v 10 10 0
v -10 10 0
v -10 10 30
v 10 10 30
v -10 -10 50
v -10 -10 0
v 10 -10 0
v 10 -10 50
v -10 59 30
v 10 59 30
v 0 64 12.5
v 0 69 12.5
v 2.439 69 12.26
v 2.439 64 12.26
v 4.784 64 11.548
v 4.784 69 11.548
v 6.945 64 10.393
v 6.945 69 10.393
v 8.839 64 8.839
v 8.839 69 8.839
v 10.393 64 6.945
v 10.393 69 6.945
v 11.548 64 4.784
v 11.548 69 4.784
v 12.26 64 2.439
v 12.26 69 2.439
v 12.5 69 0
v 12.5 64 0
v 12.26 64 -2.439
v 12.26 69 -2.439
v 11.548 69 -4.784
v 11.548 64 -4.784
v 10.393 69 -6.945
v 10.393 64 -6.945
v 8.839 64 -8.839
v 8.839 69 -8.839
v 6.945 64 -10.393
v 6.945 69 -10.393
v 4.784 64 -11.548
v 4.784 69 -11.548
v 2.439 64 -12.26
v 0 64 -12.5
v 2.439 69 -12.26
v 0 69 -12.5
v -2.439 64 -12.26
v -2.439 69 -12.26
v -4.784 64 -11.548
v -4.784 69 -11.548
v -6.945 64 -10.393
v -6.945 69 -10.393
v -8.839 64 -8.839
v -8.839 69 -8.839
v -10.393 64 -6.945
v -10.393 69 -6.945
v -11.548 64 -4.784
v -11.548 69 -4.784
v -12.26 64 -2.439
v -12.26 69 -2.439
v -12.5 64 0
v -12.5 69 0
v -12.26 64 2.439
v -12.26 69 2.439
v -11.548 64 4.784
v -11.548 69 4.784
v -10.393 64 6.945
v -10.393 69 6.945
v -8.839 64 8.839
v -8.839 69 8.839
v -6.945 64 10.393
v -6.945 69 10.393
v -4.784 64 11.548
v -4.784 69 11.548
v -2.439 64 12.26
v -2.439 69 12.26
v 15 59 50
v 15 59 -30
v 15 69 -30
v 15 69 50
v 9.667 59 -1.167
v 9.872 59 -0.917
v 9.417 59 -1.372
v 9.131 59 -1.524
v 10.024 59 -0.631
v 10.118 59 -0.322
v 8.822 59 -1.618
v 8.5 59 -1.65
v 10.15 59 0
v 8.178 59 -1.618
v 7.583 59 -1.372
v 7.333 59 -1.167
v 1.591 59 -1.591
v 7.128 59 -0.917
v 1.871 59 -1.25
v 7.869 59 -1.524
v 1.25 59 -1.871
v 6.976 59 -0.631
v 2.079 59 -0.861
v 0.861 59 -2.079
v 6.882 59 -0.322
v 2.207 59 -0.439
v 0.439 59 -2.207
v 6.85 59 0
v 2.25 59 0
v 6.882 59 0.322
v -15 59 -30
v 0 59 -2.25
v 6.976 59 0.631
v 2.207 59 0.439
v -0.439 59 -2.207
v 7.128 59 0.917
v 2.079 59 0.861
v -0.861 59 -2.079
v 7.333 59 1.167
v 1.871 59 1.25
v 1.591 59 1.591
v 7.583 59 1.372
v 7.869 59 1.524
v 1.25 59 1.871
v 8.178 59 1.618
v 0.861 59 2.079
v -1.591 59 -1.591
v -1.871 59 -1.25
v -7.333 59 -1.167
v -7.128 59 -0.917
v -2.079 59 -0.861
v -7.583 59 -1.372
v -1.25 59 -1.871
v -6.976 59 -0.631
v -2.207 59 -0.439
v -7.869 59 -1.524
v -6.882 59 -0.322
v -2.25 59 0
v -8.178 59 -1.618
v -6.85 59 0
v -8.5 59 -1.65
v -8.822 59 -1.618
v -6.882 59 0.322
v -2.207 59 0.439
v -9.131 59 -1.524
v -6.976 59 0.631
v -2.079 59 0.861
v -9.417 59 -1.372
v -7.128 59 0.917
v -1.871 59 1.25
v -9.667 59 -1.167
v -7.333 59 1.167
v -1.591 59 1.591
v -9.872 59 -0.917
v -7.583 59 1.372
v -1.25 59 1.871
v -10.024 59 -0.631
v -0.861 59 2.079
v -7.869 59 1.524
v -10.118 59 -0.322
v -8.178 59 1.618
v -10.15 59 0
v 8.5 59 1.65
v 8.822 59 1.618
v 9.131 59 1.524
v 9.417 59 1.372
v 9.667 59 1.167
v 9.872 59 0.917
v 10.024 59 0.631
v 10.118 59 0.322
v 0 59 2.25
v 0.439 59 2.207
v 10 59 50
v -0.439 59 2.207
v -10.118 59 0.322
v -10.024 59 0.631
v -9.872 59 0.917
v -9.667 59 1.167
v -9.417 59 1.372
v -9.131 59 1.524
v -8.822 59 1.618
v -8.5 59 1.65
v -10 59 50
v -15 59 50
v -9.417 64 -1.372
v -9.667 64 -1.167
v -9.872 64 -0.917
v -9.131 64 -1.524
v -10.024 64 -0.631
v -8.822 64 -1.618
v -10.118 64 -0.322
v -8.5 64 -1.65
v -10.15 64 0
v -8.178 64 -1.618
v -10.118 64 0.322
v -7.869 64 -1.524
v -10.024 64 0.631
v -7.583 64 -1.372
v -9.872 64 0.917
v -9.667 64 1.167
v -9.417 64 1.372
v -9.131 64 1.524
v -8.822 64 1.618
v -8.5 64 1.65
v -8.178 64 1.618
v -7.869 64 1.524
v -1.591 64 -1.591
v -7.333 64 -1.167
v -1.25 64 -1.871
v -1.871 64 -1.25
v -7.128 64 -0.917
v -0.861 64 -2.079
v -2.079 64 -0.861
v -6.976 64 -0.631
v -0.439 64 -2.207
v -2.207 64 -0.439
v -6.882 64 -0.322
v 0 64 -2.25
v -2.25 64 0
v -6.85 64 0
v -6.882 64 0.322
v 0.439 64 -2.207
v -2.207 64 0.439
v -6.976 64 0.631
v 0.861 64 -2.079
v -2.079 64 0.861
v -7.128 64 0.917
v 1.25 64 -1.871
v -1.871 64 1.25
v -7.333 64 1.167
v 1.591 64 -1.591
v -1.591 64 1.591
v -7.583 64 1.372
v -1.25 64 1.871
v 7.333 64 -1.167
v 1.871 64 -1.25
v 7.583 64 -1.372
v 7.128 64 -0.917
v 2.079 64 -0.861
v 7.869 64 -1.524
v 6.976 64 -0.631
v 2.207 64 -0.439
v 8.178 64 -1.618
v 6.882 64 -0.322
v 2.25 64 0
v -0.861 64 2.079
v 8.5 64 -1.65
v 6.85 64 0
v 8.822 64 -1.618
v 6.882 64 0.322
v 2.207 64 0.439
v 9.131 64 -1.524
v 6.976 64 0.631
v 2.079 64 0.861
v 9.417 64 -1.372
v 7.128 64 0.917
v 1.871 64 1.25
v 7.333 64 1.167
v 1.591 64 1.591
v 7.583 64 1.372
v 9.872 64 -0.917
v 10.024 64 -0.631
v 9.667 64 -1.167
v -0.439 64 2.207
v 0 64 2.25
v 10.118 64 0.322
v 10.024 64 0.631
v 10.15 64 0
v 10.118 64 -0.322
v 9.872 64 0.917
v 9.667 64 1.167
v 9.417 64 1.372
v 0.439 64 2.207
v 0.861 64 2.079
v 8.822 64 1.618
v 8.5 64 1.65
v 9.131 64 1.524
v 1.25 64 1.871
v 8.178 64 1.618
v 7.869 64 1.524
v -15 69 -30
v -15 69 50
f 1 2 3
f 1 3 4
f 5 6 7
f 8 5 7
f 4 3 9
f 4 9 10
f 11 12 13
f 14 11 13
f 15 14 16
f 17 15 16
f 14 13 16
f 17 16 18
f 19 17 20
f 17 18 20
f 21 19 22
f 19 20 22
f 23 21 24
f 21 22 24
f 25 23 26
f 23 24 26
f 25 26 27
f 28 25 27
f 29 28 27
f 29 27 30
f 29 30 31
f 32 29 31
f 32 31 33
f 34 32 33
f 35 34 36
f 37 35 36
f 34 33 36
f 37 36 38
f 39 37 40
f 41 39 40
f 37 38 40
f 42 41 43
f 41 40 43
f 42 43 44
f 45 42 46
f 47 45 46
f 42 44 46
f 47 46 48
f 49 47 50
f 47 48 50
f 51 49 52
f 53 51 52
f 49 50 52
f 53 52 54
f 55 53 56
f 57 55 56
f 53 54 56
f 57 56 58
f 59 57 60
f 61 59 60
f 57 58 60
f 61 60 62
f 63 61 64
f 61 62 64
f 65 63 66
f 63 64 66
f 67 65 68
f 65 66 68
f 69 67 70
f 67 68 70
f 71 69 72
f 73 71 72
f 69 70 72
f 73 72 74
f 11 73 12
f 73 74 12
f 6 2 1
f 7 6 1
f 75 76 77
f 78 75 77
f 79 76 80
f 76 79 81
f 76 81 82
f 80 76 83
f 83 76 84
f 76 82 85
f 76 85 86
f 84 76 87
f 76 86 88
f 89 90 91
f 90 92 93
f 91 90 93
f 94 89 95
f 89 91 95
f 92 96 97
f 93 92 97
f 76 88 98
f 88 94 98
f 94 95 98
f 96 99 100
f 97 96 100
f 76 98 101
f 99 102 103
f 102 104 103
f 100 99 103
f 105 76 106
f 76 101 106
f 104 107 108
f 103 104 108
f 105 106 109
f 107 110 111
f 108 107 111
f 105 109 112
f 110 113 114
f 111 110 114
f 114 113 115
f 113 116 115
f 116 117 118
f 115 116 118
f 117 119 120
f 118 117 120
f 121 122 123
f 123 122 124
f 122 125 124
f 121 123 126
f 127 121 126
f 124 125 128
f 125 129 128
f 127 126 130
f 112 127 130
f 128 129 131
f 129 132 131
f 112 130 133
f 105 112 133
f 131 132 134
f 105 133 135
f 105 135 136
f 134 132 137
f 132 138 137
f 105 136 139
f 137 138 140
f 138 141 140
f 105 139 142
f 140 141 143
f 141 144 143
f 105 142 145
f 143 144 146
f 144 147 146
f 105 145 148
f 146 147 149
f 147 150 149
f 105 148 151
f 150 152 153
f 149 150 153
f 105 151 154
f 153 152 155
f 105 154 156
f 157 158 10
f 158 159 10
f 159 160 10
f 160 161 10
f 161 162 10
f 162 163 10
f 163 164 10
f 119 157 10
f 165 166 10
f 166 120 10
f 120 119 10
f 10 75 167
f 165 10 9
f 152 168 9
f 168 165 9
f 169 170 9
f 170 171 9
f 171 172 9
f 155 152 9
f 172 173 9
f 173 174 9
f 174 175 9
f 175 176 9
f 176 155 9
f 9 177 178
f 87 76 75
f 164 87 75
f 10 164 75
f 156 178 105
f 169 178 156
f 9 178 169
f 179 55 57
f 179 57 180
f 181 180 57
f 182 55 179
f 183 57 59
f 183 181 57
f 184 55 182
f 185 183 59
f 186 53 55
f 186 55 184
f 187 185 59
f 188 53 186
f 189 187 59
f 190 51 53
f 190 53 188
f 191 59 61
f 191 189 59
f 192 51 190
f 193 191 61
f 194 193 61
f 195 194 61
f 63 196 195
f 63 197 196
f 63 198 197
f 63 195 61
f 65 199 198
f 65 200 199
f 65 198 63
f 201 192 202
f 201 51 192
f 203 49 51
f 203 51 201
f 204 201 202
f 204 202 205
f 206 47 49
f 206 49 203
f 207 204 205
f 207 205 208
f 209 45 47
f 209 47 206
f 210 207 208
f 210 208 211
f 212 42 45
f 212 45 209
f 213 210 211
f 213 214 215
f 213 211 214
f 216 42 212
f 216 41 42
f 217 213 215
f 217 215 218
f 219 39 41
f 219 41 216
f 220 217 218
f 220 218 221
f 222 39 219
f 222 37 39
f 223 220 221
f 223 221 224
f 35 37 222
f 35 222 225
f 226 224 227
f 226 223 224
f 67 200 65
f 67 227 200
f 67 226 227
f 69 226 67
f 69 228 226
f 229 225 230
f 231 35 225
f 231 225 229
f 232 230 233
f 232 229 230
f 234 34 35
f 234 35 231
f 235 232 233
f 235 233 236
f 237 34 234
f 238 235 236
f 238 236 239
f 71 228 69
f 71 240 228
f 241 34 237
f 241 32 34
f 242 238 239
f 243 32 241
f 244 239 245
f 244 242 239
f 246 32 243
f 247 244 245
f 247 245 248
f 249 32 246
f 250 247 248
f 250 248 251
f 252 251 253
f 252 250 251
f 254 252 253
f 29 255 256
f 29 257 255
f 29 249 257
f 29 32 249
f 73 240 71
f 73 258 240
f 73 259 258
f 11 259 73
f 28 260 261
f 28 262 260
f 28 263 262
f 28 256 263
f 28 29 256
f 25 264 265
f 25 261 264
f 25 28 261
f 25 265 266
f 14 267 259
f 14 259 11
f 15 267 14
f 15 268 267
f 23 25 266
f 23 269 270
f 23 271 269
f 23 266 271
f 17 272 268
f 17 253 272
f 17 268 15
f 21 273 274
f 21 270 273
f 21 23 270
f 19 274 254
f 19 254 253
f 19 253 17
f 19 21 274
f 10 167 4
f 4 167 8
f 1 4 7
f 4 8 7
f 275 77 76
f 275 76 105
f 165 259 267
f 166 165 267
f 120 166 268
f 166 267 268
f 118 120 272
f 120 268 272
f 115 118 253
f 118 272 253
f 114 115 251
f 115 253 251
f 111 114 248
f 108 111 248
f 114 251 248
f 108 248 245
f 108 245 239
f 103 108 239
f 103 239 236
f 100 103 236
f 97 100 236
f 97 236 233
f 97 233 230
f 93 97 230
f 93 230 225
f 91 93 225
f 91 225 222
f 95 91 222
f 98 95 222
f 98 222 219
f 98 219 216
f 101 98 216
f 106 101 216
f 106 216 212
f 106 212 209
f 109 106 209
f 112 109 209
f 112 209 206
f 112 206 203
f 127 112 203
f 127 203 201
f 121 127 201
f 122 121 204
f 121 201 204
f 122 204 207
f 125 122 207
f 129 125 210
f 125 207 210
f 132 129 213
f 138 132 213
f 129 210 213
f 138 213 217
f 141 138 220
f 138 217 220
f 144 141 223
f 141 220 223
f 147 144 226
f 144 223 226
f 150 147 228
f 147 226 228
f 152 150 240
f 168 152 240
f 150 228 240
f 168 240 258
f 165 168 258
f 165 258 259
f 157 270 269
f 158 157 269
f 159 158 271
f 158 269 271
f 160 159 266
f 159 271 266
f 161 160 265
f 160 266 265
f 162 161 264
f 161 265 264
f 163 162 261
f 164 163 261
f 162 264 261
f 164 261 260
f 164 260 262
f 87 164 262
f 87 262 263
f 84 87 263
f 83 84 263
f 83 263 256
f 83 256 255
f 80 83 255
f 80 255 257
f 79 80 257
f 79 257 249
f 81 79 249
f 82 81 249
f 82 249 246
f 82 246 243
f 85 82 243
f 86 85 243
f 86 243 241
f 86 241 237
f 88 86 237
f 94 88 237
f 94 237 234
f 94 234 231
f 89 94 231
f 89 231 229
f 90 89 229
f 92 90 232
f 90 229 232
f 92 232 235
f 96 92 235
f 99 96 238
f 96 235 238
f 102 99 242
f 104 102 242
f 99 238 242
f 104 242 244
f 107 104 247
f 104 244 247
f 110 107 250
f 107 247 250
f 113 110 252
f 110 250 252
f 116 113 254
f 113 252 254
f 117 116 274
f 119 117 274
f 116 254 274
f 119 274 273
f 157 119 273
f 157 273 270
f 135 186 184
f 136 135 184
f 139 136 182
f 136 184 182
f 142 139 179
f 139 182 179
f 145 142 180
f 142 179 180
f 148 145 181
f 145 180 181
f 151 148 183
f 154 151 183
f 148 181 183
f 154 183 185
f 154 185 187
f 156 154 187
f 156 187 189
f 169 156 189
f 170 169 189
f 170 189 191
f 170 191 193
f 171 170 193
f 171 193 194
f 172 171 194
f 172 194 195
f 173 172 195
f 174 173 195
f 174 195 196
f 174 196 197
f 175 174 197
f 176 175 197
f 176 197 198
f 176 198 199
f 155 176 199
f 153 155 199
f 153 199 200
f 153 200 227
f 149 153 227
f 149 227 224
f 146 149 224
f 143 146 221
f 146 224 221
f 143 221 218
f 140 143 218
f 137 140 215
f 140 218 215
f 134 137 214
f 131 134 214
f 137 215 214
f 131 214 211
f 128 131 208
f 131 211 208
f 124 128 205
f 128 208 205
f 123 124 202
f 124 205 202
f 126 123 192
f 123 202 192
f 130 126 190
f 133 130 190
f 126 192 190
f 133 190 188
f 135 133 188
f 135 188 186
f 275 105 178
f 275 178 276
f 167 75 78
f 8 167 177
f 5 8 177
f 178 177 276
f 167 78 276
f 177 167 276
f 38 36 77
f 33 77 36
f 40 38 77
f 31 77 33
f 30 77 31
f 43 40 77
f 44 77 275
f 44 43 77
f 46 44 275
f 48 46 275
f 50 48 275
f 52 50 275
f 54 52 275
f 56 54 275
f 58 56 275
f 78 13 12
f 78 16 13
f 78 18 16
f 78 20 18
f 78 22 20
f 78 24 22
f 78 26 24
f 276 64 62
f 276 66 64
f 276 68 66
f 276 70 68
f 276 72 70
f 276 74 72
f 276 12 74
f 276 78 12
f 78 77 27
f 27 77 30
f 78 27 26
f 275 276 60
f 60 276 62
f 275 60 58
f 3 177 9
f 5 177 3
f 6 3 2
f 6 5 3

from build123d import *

# Parameters (mm, degrees)
CROQUIS2_W                   = 20
CROQUIS2_H                   = 20
SALIENTE_EXTRUIR1_DEPTH      = 50
CROQUIS3_W                   = 20
CROQUIS3_H                   = 20
SALIENTE_EXTRUIR2_DEPTH      = 59
SALIENTE_EXTRUIR4_DEPTH      = 60
SALIENTE_EXTRUIR4_DEPTH_BACK = 20
CROQUIS7_W                   = 30
CROQUIS7_H                   = 10
CROQUIS14_R                  = 12.5
CORTAR_EXTRUIR4_DEPTH        = 5
CROQUIS16_R                  = 2.25
CORTAR_EXTRUIR5_DEPTH        = 10
CROQUIS19_R                  = 1.65
CORTAR_EXTRUIR6_DEPTH        = 10


with BuildPart() as part:
    # Croquis2 → Saliente-Extruir1 (new body)
    with BuildSketch(Plane.XY):
        Rectangle(CROQUIS2_W, CROQUIS2_H)
    extrude(amount=SALIENTE_EXTRUIR1_DEPTH)

    # Croquis3 → Saliente-Extruir2 (add)
    with BuildSketch(Plane(origin=(0, 10, 0), x_dir=(1, 0, 0), z_dir=(0, 1, 0))):
        with Locations((0, -40)):
            Rectangle(CROQUIS3_W, CROQUIS3_H)
    extrude(amount=SALIENTE_EXTRUIR2_DEPTH)

    # Croquis7 → Saliente-Extruir4 (add, two sides: drawn at the far end of the back side and taken through both)
    with BuildSketch(Plane(origin=(0, 0, 30), x_dir=(-1, 0, 0), z_dir=(0, 0, -1)).offset(-SALIENTE_EXTRUIR4_DEPTH_BACK)):
        with Locations((0, 64)):
            Rectangle(CROQUIS7_W, CROQUIS7_H)
    extrude(amount=SALIENTE_EXTRUIR4_DEPTH + SALIENTE_EXTRUIR4_DEPTH_BACK)

    # Croquis14 → Cortar-Extruir4 (cut)
    with BuildSketch(Plane(origin=(0, 69, 0), x_dir=(1, 0, 0), z_dir=(0, 1, 0))):
        with Locations(Location((0, 0, 0), (0, 0, 270))):
            Circle(CROQUIS14_R)
    extrude(amount=-CORTAR_EXTRUIR4_DEPTH, mode=Mode.SUBTRACT)

    # Croquis16 → Cortar-Extruir5 (cut)
    with BuildSketch(Plane(origin=(0, 64, 0), x_dir=(1, 0, 0), z_dir=(0, 1, 0))):
        with Locations(Location((0, 0, 0), (0, 0, 270))):
            Circle(CROQUIS16_R)
    extrude(amount=-CORTAR_EXTRUIR5_DEPTH, mode=Mode.SUBTRACT)

    # Croquis19 → Cortar-Extruir6 (cut)
    with BuildSketch(Plane(origin=(0, 64, 0), x_dir=(1, 0, 0), z_dir=(0, 1, 0))):
        with Locations(Location((8.5, 0, 0), (0, 0, 270))):
            Circle(CROQUIS19_R)
        with Locations(Location((-8.5, 0, 0), (0, 0, 90))):
            Circle(CROQUIS19_R)
    extrude(amount=-CORTAR_EXTRUIR6_DEPTH, mode=Mode.SUBTRACT)


solid = part.part
